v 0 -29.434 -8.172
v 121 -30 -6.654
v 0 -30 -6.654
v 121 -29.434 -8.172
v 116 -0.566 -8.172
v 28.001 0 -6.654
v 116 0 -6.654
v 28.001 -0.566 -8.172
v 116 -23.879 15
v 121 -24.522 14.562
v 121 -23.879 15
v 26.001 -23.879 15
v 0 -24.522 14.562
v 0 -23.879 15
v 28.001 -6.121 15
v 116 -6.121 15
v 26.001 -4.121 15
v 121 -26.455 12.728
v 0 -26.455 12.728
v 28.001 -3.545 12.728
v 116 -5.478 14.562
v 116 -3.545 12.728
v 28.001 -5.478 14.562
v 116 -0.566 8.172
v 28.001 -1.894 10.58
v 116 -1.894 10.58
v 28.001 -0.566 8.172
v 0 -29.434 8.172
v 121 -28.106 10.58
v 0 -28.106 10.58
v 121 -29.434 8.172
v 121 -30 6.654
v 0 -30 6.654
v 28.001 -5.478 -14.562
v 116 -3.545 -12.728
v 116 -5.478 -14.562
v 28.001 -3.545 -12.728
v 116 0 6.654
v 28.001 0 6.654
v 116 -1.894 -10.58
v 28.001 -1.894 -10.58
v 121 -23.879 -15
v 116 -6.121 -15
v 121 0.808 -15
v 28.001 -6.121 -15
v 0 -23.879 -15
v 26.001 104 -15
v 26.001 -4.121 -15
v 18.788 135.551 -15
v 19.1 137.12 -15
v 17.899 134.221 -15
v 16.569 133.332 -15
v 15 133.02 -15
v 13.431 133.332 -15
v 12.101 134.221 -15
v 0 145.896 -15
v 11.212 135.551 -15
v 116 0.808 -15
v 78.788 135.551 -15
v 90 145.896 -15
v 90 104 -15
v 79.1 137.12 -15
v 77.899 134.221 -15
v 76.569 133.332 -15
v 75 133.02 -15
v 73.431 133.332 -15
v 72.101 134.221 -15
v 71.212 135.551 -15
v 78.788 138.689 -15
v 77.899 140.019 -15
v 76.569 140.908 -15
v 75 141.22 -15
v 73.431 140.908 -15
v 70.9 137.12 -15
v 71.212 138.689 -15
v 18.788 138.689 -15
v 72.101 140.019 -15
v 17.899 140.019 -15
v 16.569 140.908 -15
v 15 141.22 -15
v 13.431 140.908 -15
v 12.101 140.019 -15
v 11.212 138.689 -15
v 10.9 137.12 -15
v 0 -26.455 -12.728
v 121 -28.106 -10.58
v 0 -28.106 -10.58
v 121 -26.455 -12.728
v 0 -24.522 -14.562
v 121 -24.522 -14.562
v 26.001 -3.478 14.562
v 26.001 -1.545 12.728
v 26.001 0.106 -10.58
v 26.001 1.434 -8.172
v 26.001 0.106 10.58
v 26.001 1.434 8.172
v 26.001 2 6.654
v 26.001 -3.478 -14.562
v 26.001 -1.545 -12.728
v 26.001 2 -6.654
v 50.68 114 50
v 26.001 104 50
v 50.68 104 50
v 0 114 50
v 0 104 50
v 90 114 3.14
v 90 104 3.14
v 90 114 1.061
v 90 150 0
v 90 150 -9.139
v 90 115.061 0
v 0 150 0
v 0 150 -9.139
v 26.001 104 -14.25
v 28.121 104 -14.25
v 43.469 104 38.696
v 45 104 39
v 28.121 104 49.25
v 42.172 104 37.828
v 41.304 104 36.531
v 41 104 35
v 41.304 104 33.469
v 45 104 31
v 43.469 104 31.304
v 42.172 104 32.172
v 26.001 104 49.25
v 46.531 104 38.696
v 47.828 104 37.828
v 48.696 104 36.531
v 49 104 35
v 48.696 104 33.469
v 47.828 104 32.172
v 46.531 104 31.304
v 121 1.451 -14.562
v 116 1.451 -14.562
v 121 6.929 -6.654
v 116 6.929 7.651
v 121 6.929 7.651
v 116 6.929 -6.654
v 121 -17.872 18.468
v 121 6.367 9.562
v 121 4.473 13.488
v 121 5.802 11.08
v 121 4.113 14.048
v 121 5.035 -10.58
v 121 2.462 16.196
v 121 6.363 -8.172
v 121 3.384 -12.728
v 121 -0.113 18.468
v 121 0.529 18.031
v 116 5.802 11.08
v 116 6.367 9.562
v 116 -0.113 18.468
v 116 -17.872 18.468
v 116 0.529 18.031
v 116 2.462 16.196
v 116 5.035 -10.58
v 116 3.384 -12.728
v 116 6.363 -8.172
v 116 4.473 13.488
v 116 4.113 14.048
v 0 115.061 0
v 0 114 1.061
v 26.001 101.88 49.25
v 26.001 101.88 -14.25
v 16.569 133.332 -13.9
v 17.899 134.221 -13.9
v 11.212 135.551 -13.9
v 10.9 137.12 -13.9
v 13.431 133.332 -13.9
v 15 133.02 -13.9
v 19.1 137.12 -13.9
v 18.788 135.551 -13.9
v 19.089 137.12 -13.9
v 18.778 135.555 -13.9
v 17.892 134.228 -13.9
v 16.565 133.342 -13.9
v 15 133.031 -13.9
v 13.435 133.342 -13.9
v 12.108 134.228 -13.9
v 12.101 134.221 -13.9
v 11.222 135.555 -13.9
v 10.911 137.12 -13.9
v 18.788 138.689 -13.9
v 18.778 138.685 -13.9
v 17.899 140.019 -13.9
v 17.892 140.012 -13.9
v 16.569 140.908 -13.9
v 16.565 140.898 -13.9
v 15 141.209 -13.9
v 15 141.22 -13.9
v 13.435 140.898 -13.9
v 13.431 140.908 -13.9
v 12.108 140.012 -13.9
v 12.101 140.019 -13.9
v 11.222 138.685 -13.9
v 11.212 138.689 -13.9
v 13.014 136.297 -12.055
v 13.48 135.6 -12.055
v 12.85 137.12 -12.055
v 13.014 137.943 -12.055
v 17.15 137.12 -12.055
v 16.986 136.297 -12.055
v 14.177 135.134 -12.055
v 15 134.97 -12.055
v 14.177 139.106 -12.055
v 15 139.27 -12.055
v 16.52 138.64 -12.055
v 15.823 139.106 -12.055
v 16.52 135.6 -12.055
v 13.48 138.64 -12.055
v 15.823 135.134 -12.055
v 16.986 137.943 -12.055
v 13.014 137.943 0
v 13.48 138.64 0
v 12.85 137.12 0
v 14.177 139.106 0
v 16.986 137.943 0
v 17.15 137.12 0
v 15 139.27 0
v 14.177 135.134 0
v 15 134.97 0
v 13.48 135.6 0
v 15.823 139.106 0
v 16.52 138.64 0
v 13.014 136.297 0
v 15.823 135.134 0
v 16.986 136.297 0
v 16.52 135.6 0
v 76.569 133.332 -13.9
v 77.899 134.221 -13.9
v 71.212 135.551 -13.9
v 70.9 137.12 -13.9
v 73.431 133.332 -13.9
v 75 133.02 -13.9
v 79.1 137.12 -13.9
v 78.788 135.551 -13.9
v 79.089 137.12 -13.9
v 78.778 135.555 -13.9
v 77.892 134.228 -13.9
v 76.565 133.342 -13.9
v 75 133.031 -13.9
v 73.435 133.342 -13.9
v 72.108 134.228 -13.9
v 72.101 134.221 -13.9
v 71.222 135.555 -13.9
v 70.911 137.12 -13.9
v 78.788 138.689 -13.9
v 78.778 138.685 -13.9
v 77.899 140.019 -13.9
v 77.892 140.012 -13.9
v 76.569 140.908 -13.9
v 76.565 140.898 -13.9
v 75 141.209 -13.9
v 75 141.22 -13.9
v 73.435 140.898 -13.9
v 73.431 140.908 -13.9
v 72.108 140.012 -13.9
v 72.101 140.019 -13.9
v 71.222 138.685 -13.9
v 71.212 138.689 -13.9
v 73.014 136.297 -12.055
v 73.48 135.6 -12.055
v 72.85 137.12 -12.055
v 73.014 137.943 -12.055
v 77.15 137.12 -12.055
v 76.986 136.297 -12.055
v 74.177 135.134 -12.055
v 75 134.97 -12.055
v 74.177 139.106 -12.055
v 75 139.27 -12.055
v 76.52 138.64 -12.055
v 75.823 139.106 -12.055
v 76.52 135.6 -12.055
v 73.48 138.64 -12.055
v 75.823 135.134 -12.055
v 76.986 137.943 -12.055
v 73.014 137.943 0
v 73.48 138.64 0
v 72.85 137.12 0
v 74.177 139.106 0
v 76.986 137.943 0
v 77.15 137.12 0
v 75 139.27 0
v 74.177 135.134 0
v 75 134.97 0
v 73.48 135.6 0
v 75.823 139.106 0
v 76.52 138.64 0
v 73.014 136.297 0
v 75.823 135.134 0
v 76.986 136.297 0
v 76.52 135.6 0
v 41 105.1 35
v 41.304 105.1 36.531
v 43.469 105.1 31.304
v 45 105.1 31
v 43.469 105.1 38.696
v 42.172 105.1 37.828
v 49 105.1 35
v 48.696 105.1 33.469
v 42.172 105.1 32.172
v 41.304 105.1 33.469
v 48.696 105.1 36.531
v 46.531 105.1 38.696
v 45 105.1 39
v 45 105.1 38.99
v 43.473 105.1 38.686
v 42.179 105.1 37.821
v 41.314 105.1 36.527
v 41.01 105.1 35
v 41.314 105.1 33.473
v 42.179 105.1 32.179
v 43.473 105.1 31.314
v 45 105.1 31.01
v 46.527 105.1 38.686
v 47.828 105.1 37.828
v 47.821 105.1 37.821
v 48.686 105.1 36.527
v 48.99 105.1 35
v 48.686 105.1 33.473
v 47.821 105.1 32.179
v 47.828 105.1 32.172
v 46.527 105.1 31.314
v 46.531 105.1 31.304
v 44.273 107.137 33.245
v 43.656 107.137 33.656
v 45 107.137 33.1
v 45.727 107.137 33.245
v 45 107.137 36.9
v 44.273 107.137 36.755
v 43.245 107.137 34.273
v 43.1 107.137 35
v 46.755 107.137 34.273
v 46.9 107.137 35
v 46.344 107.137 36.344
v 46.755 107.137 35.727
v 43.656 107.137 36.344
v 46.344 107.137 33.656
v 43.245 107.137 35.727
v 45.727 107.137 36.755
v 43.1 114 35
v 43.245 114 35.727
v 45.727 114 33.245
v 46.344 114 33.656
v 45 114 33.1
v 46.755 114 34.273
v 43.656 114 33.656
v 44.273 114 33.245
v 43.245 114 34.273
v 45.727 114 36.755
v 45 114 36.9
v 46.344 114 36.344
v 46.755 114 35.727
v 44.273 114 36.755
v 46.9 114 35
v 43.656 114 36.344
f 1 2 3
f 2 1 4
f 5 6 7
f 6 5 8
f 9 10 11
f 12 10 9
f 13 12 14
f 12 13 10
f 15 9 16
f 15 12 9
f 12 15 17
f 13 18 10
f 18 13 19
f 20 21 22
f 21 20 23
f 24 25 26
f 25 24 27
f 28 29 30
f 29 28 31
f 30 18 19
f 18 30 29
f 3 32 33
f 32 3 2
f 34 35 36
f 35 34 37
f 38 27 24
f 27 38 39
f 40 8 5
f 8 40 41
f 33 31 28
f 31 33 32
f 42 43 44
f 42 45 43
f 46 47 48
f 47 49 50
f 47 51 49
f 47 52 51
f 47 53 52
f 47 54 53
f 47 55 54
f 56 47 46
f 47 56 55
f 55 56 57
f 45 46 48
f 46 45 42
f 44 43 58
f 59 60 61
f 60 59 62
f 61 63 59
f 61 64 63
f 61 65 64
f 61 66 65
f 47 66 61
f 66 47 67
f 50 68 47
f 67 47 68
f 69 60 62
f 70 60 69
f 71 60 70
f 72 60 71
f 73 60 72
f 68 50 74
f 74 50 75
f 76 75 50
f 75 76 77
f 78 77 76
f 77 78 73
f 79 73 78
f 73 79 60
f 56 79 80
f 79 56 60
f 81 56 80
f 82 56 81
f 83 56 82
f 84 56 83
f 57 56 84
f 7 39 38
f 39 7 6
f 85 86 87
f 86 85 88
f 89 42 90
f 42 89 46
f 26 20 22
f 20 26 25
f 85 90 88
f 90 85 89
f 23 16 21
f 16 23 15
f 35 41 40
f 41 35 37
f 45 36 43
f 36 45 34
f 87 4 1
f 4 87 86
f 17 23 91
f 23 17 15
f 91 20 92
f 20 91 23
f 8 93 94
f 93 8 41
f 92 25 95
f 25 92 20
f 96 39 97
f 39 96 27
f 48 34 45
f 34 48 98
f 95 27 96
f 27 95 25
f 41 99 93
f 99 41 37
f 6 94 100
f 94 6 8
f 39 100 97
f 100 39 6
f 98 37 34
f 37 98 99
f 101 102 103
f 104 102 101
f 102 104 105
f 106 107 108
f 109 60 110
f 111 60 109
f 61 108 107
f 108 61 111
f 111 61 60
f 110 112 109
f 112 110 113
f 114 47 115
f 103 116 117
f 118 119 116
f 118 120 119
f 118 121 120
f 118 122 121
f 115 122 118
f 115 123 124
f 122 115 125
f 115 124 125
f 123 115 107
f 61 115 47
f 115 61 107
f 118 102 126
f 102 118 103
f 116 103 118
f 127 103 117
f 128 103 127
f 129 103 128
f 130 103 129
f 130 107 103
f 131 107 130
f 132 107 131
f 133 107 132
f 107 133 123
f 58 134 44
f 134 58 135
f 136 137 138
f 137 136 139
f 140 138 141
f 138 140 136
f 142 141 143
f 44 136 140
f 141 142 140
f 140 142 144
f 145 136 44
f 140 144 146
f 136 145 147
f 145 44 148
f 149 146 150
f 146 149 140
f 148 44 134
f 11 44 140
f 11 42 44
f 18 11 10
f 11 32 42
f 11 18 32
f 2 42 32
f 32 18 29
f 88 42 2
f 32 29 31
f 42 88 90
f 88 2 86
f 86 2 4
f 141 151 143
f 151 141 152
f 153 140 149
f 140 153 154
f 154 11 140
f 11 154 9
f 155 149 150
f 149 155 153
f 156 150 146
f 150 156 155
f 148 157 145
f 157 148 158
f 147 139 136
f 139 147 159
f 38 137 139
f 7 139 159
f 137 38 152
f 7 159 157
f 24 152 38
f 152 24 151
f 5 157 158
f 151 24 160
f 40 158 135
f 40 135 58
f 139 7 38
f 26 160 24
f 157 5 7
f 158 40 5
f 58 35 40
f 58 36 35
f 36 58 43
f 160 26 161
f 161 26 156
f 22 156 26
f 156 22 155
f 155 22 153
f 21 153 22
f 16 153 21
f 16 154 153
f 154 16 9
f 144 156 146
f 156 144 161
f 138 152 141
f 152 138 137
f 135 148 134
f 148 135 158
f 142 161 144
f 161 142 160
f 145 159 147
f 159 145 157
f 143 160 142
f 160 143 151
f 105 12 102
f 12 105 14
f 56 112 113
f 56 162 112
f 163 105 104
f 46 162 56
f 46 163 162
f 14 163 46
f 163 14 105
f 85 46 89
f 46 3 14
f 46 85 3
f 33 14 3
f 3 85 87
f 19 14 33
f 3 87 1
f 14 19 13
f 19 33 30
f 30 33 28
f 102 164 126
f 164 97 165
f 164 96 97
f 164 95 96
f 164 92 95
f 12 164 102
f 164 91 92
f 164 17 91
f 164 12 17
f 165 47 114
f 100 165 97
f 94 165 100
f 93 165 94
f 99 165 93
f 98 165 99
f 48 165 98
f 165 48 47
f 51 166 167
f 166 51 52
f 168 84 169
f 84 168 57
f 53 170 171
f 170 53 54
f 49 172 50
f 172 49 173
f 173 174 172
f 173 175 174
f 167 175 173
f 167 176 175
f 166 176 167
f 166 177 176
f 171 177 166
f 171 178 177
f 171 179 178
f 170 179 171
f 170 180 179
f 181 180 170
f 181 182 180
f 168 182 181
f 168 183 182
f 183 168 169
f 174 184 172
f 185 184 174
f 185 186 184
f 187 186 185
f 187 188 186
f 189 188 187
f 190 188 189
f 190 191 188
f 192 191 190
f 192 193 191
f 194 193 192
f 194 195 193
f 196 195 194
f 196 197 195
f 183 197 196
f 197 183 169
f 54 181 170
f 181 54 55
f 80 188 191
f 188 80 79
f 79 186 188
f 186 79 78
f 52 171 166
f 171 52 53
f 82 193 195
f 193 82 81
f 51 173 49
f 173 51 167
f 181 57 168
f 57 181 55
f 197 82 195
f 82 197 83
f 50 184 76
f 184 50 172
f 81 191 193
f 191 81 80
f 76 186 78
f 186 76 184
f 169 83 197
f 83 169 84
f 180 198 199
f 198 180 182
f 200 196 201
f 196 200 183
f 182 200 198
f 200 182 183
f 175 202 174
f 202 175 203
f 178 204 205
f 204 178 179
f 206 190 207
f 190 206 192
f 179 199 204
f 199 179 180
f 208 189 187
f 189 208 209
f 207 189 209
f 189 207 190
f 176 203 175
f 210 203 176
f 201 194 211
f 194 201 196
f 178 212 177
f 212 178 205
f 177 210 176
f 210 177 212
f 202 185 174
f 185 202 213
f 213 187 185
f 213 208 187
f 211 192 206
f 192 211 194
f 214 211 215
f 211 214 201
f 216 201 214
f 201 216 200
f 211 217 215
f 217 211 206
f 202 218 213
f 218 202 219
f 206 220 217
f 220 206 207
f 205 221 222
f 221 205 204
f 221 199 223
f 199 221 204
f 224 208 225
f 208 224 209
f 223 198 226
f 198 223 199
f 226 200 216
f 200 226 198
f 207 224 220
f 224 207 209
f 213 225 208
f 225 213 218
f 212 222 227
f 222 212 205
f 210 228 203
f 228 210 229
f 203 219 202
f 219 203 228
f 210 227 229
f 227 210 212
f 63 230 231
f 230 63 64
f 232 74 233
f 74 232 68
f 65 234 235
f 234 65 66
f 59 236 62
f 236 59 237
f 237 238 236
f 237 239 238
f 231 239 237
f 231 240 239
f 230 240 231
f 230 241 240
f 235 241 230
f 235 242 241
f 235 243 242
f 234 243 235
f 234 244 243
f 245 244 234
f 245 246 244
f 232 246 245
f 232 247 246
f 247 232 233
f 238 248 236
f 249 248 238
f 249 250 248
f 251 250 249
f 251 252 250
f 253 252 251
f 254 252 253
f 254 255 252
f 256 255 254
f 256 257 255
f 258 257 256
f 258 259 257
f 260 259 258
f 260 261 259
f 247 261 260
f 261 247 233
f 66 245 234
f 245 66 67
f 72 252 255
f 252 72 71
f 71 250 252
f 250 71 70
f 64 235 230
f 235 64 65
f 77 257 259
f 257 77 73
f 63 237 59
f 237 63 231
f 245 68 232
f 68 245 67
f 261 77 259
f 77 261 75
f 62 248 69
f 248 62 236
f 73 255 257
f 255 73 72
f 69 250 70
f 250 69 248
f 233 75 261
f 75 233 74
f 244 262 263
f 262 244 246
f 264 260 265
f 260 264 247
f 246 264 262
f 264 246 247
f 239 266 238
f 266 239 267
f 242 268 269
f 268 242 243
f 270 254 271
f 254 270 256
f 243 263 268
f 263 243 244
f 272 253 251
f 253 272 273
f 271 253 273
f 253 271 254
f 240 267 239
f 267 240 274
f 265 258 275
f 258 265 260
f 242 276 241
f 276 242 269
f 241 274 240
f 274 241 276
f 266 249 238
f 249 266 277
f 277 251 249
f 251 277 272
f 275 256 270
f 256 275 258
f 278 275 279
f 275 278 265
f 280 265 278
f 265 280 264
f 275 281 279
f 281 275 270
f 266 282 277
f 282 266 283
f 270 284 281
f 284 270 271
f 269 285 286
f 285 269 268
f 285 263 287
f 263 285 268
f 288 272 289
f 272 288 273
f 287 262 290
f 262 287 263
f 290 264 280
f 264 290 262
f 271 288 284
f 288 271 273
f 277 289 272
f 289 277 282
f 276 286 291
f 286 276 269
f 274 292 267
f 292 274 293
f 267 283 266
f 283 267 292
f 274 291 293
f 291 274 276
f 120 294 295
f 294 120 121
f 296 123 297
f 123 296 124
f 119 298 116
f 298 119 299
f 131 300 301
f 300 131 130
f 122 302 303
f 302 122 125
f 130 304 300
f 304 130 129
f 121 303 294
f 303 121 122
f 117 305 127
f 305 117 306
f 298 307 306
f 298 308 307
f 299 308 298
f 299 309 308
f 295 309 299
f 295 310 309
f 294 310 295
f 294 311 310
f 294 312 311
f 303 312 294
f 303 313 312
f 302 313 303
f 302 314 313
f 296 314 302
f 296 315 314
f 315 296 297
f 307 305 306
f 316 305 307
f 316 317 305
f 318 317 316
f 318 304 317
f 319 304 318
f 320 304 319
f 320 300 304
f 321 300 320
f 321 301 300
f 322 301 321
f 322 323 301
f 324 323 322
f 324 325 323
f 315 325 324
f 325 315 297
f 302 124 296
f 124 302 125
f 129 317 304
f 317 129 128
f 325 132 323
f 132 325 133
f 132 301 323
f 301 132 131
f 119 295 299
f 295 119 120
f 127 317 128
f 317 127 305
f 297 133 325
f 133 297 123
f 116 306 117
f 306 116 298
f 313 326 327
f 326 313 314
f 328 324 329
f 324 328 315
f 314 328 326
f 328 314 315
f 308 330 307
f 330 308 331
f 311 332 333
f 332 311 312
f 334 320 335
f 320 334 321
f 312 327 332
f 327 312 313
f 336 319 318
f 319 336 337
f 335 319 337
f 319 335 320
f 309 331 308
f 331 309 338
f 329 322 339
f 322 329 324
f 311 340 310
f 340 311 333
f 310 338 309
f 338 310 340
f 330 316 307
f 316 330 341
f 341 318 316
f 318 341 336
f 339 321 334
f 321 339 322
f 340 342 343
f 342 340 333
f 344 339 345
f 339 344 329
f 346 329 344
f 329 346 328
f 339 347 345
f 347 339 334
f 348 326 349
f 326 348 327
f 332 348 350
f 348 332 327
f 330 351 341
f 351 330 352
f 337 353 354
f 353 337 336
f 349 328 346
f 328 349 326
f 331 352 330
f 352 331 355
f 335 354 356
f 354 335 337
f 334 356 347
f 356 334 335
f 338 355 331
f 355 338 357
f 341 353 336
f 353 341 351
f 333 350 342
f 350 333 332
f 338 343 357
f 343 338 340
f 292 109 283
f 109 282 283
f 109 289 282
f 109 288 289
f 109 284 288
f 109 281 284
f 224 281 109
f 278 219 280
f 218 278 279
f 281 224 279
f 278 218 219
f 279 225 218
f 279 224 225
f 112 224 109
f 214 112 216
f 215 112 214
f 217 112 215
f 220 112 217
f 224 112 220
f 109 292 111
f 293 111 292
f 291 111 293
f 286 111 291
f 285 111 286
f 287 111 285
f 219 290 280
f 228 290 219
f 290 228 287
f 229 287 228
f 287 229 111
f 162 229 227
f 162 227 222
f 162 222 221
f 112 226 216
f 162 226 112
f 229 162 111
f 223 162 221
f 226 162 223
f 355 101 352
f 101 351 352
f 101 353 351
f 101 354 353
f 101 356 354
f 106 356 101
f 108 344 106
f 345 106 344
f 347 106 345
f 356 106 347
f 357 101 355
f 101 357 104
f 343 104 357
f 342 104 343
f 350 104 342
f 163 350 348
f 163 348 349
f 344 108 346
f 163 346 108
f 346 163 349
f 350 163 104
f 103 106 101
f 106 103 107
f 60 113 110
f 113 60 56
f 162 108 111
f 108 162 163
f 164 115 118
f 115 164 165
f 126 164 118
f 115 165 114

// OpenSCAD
eps = 0.001;

base = [65, 46];
base_length = 90;
clearance = 97;
lip = 7;
front_wall = 15;
arm_thickness = 26;
tube_length = 90;

// #8 wood screw.
module screw_hole(small=false) {
  $fn = 16;
  
  head_diam = small ? 8 : 8.2;

  scale([1, 1, -1]) {
    translate([0, 0, -100])
    linear_extrude(101.1)
    circle(d=head_diam);
    
    translate([0, 0, 1.1 - 0.01])
    linear_extrude(3.9, scale=0)
    circle(d=head_diam);
    
    cylinder(h=100, d=small ? 3.8 : 4.3);
  }
}

module tube_2d() {
  translate([0, -15])
  intersection() {
    square(30, center=true);
    
    scale([1, 0.9])
    circle(d=36, $fn=40);
  }
}

module lip_2d() {
  minkowski() {
    tube_2d();
    
    intersection() {
      circle(r=lip);
      
      intersection_for (a = [30, 90])
      rotate([0, 0, a])
      square(30);
    }
  }
}

module base_2d() {
  translate([front_wall-base.x, lip + clearance])
  square(base);
}

module cutout_2d() {
  translate([-front_wall, 10])
  base_2d();
}

module piece() {
  difference() {
    union() {
      linear_extrude(arm_thickness + eps)
      hull() {
        tube_2d();
        base_2d();
      }
      
      translate([0, 0, arm_thickness]) {
        linear_extrude(tube_length + eps)
        tube_2d();
        
        // Fillet at lower stress point.
        hull() {
          translate([0, 2, 0])
          linear_extrude(eps) tube_2d();
          
          translate([0, 0, 2])
          linear_extrude(eps) tube_2d();
        }
        
        linear_extrude(base_length - arm_thickness)
        base_2d();

        translate([0, 0, tube_length])
        linear_extrude(5)
        lip_2d();
      }
    }
    
    translate([0, 0, -1])
    linear_extrude(150)
    cutout_2d();
  
    // Front screw holes.
    for (z = [15, base_length-15])
    translate([front_wall, lip + clearance + base.y*0.72, z])
    rotate([0, 90, 0])
    screw_hole();

    // Bottom screw hole.
    translate([front_wall - base.x + 15, lip + clearance, base_length*0.5])
    rotate([90, 0, 0])
    screw_hole(small=true);
  
    // Cut excess material from the furthest corner.
    // TUNED
    translate([0, 100, 60])
    rotate([0, -40, 0])
    translate([0, 0, 100])
    cube(150, center=true);
    
    // Bevel the front.
    translate([front_wall, lip + clearance + base.y + 2])
    rotate([0, 0, 55])
    cube([10, 10, 300], center=true);
  }
  
  // Fillet in the corner by the 2x4.
  translate([0, lip + clearance + 10, base_length/2])
  rotate([0, 0, 45])
  cube([1.5, 1.5, base_length], center=true);
  
  // Fillet at the upper stress point.
  translate([front_wall - base.x/2, lip + clearance, arm_thickness])
  rotate([45, 0, 0])
  cube([base.x - 1.5, 3, 3], center=true);
}

module print() {
  rotate([0, 90, 0])
  piece();
}

module preview() {
  print();
  
  // The 2x4.
  color("red")
  translate([-50, lip + clearance + 10])
  cube([200, 1.5*25.4, 3.5*25.4]);
}
  
print();
